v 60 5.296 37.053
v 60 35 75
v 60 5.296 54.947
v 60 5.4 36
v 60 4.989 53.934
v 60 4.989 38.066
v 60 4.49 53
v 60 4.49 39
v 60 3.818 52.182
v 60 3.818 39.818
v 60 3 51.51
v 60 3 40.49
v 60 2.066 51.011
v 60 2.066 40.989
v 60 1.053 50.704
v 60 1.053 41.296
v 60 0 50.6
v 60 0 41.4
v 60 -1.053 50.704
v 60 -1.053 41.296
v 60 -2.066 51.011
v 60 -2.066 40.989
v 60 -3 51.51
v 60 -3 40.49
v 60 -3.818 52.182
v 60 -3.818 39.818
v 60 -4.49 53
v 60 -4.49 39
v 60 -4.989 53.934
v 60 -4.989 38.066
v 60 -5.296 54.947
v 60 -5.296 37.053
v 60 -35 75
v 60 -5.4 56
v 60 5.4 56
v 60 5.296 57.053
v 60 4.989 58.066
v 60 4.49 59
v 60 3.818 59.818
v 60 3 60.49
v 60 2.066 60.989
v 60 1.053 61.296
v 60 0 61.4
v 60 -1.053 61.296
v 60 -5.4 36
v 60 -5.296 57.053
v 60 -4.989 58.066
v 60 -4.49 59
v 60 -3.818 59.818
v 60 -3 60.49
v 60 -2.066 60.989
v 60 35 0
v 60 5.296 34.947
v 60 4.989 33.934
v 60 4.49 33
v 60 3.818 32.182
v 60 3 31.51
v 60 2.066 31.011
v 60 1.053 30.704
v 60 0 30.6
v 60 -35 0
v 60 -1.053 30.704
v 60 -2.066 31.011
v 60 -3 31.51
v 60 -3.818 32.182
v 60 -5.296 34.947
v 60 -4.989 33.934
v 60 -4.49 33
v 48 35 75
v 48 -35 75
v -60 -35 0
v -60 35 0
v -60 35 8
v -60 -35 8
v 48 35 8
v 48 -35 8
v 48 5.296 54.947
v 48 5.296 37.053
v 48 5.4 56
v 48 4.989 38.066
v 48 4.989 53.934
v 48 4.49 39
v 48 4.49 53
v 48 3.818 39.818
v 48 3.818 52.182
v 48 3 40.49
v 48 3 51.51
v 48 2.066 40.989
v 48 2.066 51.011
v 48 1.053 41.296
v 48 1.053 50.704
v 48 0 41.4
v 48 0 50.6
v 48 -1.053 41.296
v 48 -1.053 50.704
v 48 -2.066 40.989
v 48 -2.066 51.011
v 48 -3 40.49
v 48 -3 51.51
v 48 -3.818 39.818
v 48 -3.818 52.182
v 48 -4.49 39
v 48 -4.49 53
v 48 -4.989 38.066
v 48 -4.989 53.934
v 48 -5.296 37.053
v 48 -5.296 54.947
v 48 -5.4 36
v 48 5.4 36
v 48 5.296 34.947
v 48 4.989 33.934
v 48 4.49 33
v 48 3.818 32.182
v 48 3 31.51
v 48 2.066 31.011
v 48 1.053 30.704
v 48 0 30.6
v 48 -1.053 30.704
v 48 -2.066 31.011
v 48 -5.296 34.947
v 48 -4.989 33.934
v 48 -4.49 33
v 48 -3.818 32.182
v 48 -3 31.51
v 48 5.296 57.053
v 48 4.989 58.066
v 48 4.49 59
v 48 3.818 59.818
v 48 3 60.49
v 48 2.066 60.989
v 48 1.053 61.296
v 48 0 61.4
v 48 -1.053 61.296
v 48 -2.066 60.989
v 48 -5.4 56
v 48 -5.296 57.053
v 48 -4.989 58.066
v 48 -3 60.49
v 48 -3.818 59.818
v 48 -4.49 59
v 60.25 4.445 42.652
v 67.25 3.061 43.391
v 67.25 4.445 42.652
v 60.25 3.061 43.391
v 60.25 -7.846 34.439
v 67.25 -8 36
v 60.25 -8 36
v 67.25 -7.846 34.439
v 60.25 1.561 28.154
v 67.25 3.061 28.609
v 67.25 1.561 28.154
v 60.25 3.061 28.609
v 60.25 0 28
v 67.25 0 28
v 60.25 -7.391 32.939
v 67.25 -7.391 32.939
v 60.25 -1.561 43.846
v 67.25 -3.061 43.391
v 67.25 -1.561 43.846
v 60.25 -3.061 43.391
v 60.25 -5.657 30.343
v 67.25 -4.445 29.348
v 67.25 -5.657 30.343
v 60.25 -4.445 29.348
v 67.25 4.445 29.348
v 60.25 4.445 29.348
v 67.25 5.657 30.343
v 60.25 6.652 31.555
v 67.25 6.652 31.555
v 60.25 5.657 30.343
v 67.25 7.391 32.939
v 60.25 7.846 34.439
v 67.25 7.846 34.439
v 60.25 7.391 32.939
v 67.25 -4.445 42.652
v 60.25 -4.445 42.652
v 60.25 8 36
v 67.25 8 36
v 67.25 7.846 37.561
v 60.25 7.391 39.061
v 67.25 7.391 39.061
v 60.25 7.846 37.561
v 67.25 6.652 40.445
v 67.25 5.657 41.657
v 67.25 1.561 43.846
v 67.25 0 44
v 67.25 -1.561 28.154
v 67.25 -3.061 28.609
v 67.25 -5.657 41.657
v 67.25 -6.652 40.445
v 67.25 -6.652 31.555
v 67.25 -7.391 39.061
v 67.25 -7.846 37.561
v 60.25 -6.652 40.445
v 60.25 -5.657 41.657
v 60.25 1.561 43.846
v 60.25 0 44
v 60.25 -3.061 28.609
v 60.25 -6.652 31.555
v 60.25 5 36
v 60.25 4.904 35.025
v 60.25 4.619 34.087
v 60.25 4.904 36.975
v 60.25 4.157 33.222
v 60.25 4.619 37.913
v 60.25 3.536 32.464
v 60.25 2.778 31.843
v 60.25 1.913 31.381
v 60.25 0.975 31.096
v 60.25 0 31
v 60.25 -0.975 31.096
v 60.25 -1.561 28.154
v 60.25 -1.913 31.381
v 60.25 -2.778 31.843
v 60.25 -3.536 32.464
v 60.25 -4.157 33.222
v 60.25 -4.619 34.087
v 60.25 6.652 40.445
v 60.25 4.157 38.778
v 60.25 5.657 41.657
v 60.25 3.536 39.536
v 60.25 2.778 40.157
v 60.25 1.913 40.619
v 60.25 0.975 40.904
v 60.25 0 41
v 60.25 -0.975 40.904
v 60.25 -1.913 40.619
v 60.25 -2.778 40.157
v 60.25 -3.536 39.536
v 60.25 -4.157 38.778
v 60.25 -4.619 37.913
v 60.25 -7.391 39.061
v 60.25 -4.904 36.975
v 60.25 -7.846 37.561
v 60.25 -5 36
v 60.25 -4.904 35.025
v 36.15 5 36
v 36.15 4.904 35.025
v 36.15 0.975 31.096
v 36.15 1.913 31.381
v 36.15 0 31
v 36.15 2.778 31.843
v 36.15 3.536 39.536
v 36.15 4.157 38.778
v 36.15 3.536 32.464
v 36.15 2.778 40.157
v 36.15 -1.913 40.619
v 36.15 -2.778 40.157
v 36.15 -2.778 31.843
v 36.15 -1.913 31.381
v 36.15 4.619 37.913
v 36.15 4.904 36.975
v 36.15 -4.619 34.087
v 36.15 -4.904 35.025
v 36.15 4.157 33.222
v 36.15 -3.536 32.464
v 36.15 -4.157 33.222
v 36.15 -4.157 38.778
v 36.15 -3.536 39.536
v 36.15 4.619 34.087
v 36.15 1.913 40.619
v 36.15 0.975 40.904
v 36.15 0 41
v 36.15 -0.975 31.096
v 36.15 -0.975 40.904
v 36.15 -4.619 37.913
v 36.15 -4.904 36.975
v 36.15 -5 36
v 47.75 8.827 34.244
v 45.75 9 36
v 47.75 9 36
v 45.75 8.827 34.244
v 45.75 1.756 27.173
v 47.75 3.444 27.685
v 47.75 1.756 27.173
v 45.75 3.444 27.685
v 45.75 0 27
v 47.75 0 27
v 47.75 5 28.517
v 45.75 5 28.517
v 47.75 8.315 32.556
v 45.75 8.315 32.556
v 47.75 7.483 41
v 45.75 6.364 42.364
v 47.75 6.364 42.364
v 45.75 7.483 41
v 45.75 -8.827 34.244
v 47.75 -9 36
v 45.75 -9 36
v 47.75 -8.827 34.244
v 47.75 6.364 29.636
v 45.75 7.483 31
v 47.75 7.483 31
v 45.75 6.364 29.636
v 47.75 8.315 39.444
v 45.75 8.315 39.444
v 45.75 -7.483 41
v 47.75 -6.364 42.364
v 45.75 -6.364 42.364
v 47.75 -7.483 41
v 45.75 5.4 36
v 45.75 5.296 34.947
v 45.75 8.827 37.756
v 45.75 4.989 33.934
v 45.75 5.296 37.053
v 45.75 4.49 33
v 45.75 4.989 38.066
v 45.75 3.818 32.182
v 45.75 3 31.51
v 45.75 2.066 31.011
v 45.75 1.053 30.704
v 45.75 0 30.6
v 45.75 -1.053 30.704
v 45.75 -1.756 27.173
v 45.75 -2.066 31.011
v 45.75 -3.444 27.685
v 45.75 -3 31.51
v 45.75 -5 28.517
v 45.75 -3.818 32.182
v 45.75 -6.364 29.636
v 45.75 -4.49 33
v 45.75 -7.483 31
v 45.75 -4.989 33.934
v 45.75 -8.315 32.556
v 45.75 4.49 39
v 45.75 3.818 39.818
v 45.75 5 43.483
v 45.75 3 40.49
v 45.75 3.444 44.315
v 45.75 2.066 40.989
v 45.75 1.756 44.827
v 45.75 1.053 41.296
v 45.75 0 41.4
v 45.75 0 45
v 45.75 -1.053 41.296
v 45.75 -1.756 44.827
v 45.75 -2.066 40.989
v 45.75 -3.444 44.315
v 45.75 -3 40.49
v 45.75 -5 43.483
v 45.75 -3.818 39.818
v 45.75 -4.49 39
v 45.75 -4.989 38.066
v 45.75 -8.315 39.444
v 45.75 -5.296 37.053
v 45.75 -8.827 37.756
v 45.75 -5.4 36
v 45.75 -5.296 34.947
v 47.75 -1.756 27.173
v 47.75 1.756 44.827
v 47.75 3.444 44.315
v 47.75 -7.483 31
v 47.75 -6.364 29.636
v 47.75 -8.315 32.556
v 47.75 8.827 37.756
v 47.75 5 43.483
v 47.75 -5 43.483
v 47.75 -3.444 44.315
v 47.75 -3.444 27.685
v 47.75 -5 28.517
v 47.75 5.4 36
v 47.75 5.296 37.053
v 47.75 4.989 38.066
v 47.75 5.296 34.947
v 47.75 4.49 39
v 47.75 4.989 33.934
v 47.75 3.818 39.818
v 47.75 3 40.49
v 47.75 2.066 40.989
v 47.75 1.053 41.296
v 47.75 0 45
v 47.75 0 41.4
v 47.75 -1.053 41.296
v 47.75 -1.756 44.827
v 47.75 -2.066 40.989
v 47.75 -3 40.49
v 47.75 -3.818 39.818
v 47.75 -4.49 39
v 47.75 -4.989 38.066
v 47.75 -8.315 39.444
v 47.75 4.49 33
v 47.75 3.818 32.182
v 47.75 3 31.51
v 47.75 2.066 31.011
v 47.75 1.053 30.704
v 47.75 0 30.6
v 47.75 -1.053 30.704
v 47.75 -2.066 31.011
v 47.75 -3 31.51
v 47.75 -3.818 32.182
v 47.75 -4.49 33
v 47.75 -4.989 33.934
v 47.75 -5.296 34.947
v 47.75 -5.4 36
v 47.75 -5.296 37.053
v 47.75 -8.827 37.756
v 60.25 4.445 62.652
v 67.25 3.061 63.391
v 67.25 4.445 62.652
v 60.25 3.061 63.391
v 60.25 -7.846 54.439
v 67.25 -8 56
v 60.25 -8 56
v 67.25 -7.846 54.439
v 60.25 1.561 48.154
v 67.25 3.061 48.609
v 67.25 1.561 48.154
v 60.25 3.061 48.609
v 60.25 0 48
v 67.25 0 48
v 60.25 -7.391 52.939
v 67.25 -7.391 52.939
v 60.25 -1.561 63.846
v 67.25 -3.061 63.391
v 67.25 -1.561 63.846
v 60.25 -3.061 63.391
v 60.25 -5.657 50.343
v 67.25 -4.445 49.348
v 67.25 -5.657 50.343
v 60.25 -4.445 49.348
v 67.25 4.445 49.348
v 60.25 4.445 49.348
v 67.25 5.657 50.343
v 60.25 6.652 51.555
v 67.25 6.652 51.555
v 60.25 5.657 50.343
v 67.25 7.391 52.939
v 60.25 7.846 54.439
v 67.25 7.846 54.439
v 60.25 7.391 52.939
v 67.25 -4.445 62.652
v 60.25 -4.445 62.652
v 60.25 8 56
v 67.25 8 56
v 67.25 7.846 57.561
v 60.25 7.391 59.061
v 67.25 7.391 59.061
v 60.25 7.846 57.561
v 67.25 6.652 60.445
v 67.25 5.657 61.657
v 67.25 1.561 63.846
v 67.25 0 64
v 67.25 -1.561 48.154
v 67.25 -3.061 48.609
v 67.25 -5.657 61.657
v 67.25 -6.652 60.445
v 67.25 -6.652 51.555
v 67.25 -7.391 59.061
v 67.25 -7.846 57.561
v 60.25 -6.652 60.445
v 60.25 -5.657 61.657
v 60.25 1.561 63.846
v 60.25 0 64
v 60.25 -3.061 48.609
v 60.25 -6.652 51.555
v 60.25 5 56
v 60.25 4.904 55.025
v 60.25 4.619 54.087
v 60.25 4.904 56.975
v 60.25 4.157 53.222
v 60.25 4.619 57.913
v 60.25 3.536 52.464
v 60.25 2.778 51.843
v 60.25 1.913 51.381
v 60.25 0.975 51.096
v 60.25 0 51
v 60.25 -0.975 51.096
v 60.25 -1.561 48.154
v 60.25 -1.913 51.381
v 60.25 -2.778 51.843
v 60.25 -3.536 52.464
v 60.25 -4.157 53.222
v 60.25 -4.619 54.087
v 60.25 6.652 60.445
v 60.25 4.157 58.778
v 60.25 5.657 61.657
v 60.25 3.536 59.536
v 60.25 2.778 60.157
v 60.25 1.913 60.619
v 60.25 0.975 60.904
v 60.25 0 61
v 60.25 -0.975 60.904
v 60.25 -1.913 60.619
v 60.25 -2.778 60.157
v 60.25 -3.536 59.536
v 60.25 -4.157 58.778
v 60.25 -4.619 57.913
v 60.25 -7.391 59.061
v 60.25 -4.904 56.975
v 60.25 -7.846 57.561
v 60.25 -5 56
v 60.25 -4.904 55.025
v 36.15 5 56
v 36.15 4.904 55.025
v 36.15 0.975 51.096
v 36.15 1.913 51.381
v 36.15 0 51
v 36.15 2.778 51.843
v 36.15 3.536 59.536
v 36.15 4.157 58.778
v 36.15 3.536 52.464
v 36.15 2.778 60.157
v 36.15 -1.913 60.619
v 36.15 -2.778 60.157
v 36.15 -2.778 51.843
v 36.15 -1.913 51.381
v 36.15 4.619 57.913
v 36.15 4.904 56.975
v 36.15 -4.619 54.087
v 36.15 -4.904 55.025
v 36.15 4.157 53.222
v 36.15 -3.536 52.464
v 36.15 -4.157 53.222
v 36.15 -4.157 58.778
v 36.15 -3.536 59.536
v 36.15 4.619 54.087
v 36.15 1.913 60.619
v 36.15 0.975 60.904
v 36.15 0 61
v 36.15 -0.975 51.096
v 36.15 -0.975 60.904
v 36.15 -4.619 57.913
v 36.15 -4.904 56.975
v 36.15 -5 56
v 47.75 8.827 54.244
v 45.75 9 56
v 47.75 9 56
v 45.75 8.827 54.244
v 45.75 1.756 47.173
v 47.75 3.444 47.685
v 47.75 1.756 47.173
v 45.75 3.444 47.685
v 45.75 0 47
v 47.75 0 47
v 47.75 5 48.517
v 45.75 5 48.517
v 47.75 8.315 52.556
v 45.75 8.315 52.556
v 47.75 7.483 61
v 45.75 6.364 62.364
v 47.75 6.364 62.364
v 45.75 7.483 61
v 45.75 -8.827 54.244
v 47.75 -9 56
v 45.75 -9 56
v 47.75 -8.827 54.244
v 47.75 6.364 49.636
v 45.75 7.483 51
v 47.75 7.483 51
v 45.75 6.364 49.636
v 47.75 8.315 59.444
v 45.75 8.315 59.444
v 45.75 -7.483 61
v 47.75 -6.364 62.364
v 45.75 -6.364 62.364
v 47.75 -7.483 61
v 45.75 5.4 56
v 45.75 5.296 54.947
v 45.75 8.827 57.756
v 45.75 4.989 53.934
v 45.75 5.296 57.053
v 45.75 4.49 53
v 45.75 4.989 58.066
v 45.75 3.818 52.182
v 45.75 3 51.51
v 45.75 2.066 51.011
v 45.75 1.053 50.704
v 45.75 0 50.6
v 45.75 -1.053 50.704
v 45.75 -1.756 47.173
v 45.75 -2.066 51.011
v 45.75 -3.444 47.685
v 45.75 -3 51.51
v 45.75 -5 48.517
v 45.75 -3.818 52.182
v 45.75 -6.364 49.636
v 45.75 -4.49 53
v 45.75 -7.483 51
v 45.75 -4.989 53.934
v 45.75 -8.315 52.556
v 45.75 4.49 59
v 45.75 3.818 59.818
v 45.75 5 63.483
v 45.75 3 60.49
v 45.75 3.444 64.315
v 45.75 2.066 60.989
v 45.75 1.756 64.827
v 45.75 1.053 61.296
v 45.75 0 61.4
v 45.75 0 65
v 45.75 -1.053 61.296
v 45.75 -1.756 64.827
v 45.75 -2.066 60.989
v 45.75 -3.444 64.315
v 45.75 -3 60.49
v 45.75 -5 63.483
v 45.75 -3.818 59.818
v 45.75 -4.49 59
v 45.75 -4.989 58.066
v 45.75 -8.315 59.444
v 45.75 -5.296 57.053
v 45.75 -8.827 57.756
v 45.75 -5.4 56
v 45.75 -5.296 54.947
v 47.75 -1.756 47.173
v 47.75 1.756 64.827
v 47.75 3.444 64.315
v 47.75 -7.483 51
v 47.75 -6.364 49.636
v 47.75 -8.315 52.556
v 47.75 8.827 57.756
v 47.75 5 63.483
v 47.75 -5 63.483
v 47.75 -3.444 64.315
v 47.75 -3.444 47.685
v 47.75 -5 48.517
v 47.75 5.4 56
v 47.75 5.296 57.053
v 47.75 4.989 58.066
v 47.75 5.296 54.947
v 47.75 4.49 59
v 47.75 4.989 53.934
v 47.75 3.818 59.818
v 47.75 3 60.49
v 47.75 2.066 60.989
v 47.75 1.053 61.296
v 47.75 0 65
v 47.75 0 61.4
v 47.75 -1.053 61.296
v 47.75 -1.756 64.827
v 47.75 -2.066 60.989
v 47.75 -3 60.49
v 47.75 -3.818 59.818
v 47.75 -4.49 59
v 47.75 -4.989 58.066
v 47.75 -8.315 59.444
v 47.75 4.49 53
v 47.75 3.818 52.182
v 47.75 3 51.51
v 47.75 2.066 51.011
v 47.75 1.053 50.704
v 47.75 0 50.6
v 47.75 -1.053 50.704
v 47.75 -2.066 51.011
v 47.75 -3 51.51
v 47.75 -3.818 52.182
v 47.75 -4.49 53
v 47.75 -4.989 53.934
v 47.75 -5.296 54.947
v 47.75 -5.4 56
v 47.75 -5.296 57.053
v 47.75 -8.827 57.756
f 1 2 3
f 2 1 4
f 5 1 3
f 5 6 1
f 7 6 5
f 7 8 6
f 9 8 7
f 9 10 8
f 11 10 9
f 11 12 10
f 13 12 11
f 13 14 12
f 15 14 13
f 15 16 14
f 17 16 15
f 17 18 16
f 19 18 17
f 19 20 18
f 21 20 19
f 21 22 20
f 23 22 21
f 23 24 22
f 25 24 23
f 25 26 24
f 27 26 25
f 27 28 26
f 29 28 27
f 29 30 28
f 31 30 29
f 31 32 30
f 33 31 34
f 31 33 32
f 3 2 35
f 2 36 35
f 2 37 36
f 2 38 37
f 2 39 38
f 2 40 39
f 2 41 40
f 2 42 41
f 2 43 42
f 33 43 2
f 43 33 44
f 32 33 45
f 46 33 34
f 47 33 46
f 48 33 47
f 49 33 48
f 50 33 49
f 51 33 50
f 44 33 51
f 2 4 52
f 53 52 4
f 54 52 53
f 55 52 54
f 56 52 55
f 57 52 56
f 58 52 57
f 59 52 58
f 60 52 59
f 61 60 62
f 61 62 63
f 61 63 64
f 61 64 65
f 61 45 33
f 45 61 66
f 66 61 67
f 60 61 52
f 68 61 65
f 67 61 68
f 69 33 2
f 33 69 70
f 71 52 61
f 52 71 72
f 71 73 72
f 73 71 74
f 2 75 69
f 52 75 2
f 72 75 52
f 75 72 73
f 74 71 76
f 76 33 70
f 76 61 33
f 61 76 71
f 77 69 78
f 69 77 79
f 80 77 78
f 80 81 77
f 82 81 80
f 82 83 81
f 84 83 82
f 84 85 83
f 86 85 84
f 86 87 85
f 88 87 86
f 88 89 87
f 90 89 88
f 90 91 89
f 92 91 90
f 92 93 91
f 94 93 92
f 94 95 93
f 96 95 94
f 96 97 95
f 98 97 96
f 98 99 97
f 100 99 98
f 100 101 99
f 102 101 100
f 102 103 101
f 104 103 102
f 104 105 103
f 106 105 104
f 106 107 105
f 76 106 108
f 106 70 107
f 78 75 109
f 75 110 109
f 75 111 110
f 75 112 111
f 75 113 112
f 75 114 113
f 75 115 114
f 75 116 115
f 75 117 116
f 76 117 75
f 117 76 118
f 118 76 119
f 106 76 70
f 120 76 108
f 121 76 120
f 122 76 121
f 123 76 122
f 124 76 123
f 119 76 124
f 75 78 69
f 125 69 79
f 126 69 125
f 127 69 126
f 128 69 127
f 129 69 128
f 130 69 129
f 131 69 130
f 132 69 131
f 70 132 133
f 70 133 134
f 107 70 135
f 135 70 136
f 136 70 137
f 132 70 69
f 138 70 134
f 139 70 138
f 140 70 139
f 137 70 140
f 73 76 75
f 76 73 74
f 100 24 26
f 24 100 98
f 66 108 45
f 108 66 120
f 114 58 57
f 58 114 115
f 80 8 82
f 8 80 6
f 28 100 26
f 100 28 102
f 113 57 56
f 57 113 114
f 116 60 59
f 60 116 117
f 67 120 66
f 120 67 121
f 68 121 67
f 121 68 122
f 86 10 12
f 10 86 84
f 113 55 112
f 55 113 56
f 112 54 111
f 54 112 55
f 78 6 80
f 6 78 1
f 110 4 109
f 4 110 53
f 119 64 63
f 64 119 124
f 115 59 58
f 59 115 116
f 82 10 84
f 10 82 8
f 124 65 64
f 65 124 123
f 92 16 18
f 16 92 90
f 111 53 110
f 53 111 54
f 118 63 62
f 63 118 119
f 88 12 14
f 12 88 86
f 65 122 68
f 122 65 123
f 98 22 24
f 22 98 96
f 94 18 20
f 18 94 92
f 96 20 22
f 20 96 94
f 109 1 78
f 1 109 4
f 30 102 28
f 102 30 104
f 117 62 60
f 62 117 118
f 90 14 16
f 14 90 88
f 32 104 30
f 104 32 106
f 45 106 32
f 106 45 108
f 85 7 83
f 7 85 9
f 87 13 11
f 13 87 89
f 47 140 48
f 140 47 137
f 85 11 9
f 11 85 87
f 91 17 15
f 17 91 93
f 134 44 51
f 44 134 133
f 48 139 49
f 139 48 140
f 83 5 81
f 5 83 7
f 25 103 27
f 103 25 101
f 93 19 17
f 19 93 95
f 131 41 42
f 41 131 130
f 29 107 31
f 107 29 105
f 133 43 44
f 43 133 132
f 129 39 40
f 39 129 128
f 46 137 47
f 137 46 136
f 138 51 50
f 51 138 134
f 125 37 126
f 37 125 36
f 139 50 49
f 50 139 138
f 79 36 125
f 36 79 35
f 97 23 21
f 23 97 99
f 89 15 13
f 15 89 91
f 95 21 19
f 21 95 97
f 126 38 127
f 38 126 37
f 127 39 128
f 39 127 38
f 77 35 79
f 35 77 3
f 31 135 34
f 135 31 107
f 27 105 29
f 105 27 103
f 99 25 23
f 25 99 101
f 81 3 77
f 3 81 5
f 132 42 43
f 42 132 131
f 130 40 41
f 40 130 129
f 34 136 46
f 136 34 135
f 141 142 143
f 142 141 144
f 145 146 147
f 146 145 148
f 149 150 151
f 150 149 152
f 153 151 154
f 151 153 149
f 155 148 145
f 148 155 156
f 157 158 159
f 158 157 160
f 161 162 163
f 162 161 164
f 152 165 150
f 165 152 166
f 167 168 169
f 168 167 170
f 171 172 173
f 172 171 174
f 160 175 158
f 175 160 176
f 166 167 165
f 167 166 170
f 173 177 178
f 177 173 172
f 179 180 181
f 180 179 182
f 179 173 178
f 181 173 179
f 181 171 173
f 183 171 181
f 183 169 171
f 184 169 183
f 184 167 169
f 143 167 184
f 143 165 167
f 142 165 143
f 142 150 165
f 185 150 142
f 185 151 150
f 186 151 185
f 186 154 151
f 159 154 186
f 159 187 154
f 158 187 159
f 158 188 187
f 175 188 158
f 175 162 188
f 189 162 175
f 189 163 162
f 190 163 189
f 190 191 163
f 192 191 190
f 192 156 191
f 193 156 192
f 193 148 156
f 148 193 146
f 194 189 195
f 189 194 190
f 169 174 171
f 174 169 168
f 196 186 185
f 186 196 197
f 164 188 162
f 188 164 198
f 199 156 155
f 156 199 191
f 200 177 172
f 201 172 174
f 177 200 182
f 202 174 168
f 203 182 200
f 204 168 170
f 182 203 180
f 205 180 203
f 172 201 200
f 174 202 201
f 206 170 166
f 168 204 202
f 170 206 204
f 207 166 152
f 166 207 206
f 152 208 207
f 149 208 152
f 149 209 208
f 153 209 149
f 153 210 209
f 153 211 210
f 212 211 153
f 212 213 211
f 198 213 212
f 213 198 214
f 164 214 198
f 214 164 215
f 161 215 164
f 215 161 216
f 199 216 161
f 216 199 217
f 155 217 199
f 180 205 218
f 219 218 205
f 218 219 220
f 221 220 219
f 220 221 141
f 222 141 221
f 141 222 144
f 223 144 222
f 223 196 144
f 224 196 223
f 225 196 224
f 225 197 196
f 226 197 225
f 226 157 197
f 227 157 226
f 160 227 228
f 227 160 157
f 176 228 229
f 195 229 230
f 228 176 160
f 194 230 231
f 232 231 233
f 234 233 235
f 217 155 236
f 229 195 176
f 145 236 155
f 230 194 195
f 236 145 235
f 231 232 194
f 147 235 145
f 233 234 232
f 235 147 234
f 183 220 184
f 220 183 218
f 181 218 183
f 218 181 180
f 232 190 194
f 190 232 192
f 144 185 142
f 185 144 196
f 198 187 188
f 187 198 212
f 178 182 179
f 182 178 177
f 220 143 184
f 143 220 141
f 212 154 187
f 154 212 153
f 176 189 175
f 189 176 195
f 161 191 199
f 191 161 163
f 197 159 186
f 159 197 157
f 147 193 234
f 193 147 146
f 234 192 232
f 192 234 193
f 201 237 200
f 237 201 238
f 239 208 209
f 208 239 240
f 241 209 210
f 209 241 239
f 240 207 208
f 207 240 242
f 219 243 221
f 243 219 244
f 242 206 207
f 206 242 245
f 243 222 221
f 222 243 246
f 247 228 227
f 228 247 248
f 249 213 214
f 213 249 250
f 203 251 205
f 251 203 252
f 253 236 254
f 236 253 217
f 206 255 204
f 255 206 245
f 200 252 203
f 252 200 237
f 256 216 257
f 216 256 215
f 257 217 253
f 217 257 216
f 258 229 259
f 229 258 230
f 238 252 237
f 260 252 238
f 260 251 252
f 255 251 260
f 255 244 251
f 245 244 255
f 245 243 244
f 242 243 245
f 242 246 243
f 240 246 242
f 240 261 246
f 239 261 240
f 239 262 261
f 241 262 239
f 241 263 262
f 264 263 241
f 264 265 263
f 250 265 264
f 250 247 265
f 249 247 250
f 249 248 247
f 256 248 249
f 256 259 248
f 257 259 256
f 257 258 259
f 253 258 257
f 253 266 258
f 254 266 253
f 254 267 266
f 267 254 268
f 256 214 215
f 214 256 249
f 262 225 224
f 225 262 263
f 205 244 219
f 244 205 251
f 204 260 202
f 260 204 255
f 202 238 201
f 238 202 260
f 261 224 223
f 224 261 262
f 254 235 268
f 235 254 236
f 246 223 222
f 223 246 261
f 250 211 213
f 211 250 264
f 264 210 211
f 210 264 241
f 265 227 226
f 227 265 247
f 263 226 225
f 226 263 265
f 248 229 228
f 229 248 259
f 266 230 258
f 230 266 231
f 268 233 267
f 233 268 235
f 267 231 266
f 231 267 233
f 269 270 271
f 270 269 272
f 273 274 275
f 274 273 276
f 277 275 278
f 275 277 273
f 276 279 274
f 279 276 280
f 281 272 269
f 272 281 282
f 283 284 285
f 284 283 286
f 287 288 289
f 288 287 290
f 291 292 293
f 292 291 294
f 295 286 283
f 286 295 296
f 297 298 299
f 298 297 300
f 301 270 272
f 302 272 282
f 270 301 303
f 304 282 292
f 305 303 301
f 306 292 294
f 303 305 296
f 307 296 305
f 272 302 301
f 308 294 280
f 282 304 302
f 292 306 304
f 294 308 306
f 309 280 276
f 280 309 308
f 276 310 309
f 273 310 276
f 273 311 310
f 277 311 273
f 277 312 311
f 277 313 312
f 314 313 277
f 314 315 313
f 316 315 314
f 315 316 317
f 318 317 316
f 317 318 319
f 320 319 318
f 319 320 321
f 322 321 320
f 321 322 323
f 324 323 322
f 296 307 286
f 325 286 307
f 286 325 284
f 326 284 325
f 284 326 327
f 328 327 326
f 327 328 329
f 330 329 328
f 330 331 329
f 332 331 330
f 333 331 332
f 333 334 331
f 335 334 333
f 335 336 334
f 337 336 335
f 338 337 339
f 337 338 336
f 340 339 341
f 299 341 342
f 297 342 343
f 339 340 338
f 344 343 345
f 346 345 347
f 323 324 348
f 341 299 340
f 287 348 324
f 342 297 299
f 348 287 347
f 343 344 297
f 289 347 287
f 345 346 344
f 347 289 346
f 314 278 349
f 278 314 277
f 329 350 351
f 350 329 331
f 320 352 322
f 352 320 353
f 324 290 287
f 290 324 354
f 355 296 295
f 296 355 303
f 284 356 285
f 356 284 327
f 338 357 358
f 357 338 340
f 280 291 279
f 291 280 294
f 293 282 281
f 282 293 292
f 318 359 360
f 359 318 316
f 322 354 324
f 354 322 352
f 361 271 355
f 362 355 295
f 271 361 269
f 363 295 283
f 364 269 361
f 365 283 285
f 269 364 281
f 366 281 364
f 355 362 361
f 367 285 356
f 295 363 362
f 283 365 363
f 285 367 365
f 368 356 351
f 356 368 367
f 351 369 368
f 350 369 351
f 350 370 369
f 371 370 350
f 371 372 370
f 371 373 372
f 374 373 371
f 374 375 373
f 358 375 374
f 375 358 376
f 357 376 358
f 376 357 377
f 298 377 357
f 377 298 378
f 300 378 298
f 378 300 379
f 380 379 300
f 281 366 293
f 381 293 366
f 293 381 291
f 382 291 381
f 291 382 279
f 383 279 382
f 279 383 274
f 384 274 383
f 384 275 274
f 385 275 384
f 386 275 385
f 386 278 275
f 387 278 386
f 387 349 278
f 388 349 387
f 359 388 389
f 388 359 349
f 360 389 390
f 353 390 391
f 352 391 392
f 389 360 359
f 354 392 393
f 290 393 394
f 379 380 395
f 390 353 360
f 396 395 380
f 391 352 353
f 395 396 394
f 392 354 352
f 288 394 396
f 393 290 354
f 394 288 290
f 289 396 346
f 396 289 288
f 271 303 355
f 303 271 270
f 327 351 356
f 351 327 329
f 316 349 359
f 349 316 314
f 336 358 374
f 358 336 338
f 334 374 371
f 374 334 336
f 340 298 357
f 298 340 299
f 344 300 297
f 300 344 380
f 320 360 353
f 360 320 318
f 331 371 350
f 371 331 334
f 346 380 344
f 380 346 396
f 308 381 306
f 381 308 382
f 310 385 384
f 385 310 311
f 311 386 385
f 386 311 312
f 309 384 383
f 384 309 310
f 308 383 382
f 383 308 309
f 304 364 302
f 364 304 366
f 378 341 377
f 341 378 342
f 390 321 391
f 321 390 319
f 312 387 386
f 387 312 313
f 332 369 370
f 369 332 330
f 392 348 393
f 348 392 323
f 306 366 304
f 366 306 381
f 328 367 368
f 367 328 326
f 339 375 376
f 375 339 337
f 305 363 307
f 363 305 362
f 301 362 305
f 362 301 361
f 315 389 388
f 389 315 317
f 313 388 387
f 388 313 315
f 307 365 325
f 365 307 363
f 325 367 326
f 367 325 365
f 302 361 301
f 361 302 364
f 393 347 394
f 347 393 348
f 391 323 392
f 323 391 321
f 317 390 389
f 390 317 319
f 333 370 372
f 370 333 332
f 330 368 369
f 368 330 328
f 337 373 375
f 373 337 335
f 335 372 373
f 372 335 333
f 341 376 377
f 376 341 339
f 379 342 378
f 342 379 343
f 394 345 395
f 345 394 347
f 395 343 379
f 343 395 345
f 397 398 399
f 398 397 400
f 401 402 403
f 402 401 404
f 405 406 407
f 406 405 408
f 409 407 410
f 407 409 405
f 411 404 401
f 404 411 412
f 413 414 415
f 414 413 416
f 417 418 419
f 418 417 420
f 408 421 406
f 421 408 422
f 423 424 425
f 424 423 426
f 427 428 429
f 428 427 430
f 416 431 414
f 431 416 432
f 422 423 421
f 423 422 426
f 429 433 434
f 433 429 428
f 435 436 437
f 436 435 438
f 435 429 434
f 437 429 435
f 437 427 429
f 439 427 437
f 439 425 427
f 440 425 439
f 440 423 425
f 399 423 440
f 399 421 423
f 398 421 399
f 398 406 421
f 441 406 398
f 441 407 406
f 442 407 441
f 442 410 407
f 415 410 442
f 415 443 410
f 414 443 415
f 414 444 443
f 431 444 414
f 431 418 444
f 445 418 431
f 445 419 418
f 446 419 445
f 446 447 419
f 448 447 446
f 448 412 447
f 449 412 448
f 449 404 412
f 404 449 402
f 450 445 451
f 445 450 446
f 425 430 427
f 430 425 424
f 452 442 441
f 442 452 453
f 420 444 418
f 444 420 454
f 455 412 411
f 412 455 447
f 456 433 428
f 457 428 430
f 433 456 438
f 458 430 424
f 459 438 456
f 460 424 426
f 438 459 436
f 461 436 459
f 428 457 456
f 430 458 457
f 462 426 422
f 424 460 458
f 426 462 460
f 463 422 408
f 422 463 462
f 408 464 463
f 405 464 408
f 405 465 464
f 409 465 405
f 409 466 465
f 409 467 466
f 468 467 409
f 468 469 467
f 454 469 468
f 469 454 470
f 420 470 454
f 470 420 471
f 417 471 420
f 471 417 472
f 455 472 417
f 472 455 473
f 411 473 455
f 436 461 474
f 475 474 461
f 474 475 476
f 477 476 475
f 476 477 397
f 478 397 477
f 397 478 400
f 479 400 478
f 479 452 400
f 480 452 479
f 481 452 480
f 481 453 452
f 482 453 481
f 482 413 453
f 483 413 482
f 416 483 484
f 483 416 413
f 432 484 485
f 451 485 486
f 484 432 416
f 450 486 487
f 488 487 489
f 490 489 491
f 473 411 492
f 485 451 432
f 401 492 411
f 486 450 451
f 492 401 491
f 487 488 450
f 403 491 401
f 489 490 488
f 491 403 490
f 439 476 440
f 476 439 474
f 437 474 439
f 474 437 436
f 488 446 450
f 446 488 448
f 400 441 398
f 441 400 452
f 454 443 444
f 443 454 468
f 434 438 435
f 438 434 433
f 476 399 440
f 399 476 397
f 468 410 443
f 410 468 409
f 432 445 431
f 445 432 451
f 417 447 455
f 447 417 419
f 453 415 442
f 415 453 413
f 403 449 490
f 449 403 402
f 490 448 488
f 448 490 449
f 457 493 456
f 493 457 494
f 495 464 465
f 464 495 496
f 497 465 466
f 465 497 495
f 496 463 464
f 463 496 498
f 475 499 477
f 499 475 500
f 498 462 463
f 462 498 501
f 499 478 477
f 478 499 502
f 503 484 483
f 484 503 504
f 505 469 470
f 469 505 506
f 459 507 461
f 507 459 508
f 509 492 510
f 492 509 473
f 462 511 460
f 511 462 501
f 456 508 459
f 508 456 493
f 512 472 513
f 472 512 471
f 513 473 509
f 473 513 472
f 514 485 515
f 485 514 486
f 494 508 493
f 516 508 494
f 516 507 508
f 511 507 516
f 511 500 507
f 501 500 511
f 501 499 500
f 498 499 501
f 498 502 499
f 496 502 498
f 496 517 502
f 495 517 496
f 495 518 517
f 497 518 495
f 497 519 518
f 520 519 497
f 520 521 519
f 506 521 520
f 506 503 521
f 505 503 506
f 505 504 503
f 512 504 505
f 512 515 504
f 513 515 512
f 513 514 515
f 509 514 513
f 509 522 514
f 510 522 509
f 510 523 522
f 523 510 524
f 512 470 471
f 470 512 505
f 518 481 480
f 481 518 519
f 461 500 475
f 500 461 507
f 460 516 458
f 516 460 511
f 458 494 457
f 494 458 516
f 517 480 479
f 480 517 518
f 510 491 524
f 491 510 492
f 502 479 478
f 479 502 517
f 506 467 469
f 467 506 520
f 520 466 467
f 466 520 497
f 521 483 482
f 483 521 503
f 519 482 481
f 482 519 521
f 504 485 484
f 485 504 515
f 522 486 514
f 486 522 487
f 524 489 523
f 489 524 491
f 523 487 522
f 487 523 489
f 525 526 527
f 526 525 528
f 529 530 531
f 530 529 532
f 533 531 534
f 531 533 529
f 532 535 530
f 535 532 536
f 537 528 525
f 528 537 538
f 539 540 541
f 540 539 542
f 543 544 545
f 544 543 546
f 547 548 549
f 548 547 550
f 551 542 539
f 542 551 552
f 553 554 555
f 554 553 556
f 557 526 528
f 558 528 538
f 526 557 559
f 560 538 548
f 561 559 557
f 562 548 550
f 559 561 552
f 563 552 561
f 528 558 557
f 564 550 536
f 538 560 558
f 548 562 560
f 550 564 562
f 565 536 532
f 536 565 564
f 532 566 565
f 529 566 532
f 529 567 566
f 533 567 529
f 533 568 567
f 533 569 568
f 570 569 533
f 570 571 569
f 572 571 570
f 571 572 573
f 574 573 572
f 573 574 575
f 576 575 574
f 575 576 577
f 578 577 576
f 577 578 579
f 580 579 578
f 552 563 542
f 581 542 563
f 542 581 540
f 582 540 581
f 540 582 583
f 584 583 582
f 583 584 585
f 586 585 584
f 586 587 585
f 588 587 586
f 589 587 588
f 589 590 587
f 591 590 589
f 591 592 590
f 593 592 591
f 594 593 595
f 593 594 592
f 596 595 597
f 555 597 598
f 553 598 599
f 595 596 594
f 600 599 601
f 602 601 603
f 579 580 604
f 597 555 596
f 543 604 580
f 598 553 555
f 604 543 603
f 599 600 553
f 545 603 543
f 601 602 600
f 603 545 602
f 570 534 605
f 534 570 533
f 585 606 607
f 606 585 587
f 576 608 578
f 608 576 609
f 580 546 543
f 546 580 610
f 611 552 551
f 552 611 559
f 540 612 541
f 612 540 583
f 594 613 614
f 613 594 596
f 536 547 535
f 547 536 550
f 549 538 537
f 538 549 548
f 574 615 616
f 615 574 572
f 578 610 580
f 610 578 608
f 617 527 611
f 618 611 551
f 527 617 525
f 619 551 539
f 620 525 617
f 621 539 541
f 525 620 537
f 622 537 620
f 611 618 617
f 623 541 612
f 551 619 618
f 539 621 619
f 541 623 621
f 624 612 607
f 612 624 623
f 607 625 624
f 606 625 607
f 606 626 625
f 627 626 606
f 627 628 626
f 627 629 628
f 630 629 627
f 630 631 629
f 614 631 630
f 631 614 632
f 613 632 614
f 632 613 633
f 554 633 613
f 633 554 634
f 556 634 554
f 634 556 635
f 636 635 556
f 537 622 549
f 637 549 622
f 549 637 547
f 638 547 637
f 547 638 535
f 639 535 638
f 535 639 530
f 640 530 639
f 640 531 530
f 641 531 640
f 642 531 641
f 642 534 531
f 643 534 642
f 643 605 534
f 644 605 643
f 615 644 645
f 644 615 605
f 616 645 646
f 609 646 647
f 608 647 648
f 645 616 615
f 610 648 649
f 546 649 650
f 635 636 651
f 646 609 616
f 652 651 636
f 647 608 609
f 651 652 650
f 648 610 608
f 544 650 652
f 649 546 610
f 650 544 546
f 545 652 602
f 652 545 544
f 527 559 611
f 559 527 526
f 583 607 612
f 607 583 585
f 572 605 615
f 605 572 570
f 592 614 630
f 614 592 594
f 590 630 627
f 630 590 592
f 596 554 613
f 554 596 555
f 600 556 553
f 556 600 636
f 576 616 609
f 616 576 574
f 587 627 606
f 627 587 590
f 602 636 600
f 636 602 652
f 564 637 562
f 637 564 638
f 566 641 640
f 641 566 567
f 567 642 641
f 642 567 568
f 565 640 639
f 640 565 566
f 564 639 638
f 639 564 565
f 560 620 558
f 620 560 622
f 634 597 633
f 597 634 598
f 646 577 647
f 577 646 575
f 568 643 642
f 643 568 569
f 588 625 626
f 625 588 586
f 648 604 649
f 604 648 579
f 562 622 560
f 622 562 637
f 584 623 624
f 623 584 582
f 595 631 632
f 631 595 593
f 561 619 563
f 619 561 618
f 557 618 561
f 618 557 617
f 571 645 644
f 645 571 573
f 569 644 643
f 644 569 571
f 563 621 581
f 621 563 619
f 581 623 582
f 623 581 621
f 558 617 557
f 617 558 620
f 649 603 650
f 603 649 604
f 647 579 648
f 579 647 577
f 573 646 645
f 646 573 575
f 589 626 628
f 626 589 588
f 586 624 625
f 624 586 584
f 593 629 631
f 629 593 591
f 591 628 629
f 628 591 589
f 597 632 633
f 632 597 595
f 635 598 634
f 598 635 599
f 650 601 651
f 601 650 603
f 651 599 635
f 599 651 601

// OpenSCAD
$fn = 32;

// ------------------------------------------------------------------------
// Bolted bracket: 120 x 70 mm bracket with 2 bolt joints
// Every part is its own module, assembly() places them once.
// ------------------------------------------------------------------------

// --- part 1 ---
module bracket() {
  difference() {
    translate([-60, -35, 0]) cube([120, 70, 75]);
    translate([-61, -36, 8]) cube([109, 72, 68]);
    translate([54, 0, 36]) rotate([0, 90, 0]) cylinder(h = 14, d = 10.8, center = true);
    translate([54, 0, 56]) rotate([0, 90, 0]) cylinder(h = 14, d = 10.8, center = true);
  }
}

// --- part 2 ---
module bolt1() {
  cylinder(h = 7, d = 16);
  translate([0, 0, -24.1]) cylinder(h = 24.1, d = 10);
}

// --- part 3 ---
module washer1() {
  difference() {
      translate([0, 0, 0]) cylinder(h = 2, d = 18);
      translate([0, 0, -1]) cylinder(h = 4, d = 10.8);
    }
}

// --- part 4 ---
module bolt2() {
  cylinder(h = 7, d = 16);
  translate([0, 0, -24.1]) cylinder(h = 24.1, d = 10);
}

// --- part 5 ---
module washer2() {
  difference() {
      translate([0, 0, 0]) cylinder(h = 2, d = 18);
      translate([0, 0, -1]) cylinder(h = 4, d = 10.8);
    }
}

// --- assembly ---
module assembly() {
  translate([0, 0, 0]) rotate([0, 0, 0]) bracket();
  translate([60.25, 0, 36]) rotate([0, 90, 0]) bolt1();
  translate([45.75, 0, 36]) rotate([0, 90, 0]) washer1();
  translate([60.25, 0, 56]) rotate([0, 90, 0]) bolt2();
  translate([45.75, 0, 56]) rotate([0, 90, 0]) washer2();
}

assembly();
